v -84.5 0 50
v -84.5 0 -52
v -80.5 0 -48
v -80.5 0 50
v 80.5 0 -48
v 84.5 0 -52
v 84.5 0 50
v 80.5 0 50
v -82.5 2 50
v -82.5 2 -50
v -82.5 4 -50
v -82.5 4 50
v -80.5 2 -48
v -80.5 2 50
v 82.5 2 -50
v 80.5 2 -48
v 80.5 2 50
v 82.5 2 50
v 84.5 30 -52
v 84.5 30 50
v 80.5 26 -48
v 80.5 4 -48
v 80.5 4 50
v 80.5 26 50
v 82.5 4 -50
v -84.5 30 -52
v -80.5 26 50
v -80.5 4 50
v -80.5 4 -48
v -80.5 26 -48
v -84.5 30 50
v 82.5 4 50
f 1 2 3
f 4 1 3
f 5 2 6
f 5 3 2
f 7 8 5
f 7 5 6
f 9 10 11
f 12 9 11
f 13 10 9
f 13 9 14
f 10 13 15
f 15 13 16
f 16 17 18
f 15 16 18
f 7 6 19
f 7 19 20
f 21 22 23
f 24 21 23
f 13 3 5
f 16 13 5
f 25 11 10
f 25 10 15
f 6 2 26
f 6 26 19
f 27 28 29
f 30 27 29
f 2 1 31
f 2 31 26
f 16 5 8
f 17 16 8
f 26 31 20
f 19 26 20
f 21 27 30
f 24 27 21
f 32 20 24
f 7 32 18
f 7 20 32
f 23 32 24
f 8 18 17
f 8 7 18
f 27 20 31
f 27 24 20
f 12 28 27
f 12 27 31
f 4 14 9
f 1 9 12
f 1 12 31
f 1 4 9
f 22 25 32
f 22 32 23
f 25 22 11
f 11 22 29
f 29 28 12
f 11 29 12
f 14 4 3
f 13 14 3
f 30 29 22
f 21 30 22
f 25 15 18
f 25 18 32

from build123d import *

# Parameters (mm, degrees)
F1_W     = 161
F1_H     = 96
F1_H_2   = 2
F2_DEPTH = 30
F3_T     = -4
F4_W     = 161
F4_H     = 2
F4_W_2   = 2
F5_DEPTH = 100


with BuildPart() as f2:
    # F1 (on Front) → F2 (new body)
    with BuildSketch(Plane.XZ):
        Polygon((82.5, 50), (82.5, -50), (-82.5, -50), (-82.5, 50), (-84.5, 50), (-84.5, -52), (84.5, -52), (84.5, 50), align=None)
        Polygon((-82.5, -50), (82.5, -50), (82.5, 50), (80.5, 50), (80.5, 48), (80.5, -48), (-80.5, -48), (-80.5, 48), (-80.5, 50), (-82.5, 50), align=None)
        Rectangle(F1_W, F1_H)
        with Locations((0, 49)):
            Rectangle(F1_W, F1_H_2)
    extrude(amount=-F2_DEPTH)

    # F3
    f3_openings = [f2.faces().sort_by_distance(p)[0] for p in [
        (0, 15, 50),
        (0, 0, -1),
    ]]
    offset(amount=F3_T, openings=f3_openings)

    # F4 (on face) → F5 (cut)
    with BuildSketch(Plane.XY.offset(50)):
        with Locations((0, 3)):
            Rectangle(F4_W, F4_H)
        with Locations((-81.5, 3)):
            Rectangle(F4_W_2, F4_H)
        with Locations((81.5, 3)):
            Rectangle(F4_W_2, F4_H)
    extrude(amount=-F5_DEPTH, mode=Mode.SUBTRACT)


solid = f2.part
